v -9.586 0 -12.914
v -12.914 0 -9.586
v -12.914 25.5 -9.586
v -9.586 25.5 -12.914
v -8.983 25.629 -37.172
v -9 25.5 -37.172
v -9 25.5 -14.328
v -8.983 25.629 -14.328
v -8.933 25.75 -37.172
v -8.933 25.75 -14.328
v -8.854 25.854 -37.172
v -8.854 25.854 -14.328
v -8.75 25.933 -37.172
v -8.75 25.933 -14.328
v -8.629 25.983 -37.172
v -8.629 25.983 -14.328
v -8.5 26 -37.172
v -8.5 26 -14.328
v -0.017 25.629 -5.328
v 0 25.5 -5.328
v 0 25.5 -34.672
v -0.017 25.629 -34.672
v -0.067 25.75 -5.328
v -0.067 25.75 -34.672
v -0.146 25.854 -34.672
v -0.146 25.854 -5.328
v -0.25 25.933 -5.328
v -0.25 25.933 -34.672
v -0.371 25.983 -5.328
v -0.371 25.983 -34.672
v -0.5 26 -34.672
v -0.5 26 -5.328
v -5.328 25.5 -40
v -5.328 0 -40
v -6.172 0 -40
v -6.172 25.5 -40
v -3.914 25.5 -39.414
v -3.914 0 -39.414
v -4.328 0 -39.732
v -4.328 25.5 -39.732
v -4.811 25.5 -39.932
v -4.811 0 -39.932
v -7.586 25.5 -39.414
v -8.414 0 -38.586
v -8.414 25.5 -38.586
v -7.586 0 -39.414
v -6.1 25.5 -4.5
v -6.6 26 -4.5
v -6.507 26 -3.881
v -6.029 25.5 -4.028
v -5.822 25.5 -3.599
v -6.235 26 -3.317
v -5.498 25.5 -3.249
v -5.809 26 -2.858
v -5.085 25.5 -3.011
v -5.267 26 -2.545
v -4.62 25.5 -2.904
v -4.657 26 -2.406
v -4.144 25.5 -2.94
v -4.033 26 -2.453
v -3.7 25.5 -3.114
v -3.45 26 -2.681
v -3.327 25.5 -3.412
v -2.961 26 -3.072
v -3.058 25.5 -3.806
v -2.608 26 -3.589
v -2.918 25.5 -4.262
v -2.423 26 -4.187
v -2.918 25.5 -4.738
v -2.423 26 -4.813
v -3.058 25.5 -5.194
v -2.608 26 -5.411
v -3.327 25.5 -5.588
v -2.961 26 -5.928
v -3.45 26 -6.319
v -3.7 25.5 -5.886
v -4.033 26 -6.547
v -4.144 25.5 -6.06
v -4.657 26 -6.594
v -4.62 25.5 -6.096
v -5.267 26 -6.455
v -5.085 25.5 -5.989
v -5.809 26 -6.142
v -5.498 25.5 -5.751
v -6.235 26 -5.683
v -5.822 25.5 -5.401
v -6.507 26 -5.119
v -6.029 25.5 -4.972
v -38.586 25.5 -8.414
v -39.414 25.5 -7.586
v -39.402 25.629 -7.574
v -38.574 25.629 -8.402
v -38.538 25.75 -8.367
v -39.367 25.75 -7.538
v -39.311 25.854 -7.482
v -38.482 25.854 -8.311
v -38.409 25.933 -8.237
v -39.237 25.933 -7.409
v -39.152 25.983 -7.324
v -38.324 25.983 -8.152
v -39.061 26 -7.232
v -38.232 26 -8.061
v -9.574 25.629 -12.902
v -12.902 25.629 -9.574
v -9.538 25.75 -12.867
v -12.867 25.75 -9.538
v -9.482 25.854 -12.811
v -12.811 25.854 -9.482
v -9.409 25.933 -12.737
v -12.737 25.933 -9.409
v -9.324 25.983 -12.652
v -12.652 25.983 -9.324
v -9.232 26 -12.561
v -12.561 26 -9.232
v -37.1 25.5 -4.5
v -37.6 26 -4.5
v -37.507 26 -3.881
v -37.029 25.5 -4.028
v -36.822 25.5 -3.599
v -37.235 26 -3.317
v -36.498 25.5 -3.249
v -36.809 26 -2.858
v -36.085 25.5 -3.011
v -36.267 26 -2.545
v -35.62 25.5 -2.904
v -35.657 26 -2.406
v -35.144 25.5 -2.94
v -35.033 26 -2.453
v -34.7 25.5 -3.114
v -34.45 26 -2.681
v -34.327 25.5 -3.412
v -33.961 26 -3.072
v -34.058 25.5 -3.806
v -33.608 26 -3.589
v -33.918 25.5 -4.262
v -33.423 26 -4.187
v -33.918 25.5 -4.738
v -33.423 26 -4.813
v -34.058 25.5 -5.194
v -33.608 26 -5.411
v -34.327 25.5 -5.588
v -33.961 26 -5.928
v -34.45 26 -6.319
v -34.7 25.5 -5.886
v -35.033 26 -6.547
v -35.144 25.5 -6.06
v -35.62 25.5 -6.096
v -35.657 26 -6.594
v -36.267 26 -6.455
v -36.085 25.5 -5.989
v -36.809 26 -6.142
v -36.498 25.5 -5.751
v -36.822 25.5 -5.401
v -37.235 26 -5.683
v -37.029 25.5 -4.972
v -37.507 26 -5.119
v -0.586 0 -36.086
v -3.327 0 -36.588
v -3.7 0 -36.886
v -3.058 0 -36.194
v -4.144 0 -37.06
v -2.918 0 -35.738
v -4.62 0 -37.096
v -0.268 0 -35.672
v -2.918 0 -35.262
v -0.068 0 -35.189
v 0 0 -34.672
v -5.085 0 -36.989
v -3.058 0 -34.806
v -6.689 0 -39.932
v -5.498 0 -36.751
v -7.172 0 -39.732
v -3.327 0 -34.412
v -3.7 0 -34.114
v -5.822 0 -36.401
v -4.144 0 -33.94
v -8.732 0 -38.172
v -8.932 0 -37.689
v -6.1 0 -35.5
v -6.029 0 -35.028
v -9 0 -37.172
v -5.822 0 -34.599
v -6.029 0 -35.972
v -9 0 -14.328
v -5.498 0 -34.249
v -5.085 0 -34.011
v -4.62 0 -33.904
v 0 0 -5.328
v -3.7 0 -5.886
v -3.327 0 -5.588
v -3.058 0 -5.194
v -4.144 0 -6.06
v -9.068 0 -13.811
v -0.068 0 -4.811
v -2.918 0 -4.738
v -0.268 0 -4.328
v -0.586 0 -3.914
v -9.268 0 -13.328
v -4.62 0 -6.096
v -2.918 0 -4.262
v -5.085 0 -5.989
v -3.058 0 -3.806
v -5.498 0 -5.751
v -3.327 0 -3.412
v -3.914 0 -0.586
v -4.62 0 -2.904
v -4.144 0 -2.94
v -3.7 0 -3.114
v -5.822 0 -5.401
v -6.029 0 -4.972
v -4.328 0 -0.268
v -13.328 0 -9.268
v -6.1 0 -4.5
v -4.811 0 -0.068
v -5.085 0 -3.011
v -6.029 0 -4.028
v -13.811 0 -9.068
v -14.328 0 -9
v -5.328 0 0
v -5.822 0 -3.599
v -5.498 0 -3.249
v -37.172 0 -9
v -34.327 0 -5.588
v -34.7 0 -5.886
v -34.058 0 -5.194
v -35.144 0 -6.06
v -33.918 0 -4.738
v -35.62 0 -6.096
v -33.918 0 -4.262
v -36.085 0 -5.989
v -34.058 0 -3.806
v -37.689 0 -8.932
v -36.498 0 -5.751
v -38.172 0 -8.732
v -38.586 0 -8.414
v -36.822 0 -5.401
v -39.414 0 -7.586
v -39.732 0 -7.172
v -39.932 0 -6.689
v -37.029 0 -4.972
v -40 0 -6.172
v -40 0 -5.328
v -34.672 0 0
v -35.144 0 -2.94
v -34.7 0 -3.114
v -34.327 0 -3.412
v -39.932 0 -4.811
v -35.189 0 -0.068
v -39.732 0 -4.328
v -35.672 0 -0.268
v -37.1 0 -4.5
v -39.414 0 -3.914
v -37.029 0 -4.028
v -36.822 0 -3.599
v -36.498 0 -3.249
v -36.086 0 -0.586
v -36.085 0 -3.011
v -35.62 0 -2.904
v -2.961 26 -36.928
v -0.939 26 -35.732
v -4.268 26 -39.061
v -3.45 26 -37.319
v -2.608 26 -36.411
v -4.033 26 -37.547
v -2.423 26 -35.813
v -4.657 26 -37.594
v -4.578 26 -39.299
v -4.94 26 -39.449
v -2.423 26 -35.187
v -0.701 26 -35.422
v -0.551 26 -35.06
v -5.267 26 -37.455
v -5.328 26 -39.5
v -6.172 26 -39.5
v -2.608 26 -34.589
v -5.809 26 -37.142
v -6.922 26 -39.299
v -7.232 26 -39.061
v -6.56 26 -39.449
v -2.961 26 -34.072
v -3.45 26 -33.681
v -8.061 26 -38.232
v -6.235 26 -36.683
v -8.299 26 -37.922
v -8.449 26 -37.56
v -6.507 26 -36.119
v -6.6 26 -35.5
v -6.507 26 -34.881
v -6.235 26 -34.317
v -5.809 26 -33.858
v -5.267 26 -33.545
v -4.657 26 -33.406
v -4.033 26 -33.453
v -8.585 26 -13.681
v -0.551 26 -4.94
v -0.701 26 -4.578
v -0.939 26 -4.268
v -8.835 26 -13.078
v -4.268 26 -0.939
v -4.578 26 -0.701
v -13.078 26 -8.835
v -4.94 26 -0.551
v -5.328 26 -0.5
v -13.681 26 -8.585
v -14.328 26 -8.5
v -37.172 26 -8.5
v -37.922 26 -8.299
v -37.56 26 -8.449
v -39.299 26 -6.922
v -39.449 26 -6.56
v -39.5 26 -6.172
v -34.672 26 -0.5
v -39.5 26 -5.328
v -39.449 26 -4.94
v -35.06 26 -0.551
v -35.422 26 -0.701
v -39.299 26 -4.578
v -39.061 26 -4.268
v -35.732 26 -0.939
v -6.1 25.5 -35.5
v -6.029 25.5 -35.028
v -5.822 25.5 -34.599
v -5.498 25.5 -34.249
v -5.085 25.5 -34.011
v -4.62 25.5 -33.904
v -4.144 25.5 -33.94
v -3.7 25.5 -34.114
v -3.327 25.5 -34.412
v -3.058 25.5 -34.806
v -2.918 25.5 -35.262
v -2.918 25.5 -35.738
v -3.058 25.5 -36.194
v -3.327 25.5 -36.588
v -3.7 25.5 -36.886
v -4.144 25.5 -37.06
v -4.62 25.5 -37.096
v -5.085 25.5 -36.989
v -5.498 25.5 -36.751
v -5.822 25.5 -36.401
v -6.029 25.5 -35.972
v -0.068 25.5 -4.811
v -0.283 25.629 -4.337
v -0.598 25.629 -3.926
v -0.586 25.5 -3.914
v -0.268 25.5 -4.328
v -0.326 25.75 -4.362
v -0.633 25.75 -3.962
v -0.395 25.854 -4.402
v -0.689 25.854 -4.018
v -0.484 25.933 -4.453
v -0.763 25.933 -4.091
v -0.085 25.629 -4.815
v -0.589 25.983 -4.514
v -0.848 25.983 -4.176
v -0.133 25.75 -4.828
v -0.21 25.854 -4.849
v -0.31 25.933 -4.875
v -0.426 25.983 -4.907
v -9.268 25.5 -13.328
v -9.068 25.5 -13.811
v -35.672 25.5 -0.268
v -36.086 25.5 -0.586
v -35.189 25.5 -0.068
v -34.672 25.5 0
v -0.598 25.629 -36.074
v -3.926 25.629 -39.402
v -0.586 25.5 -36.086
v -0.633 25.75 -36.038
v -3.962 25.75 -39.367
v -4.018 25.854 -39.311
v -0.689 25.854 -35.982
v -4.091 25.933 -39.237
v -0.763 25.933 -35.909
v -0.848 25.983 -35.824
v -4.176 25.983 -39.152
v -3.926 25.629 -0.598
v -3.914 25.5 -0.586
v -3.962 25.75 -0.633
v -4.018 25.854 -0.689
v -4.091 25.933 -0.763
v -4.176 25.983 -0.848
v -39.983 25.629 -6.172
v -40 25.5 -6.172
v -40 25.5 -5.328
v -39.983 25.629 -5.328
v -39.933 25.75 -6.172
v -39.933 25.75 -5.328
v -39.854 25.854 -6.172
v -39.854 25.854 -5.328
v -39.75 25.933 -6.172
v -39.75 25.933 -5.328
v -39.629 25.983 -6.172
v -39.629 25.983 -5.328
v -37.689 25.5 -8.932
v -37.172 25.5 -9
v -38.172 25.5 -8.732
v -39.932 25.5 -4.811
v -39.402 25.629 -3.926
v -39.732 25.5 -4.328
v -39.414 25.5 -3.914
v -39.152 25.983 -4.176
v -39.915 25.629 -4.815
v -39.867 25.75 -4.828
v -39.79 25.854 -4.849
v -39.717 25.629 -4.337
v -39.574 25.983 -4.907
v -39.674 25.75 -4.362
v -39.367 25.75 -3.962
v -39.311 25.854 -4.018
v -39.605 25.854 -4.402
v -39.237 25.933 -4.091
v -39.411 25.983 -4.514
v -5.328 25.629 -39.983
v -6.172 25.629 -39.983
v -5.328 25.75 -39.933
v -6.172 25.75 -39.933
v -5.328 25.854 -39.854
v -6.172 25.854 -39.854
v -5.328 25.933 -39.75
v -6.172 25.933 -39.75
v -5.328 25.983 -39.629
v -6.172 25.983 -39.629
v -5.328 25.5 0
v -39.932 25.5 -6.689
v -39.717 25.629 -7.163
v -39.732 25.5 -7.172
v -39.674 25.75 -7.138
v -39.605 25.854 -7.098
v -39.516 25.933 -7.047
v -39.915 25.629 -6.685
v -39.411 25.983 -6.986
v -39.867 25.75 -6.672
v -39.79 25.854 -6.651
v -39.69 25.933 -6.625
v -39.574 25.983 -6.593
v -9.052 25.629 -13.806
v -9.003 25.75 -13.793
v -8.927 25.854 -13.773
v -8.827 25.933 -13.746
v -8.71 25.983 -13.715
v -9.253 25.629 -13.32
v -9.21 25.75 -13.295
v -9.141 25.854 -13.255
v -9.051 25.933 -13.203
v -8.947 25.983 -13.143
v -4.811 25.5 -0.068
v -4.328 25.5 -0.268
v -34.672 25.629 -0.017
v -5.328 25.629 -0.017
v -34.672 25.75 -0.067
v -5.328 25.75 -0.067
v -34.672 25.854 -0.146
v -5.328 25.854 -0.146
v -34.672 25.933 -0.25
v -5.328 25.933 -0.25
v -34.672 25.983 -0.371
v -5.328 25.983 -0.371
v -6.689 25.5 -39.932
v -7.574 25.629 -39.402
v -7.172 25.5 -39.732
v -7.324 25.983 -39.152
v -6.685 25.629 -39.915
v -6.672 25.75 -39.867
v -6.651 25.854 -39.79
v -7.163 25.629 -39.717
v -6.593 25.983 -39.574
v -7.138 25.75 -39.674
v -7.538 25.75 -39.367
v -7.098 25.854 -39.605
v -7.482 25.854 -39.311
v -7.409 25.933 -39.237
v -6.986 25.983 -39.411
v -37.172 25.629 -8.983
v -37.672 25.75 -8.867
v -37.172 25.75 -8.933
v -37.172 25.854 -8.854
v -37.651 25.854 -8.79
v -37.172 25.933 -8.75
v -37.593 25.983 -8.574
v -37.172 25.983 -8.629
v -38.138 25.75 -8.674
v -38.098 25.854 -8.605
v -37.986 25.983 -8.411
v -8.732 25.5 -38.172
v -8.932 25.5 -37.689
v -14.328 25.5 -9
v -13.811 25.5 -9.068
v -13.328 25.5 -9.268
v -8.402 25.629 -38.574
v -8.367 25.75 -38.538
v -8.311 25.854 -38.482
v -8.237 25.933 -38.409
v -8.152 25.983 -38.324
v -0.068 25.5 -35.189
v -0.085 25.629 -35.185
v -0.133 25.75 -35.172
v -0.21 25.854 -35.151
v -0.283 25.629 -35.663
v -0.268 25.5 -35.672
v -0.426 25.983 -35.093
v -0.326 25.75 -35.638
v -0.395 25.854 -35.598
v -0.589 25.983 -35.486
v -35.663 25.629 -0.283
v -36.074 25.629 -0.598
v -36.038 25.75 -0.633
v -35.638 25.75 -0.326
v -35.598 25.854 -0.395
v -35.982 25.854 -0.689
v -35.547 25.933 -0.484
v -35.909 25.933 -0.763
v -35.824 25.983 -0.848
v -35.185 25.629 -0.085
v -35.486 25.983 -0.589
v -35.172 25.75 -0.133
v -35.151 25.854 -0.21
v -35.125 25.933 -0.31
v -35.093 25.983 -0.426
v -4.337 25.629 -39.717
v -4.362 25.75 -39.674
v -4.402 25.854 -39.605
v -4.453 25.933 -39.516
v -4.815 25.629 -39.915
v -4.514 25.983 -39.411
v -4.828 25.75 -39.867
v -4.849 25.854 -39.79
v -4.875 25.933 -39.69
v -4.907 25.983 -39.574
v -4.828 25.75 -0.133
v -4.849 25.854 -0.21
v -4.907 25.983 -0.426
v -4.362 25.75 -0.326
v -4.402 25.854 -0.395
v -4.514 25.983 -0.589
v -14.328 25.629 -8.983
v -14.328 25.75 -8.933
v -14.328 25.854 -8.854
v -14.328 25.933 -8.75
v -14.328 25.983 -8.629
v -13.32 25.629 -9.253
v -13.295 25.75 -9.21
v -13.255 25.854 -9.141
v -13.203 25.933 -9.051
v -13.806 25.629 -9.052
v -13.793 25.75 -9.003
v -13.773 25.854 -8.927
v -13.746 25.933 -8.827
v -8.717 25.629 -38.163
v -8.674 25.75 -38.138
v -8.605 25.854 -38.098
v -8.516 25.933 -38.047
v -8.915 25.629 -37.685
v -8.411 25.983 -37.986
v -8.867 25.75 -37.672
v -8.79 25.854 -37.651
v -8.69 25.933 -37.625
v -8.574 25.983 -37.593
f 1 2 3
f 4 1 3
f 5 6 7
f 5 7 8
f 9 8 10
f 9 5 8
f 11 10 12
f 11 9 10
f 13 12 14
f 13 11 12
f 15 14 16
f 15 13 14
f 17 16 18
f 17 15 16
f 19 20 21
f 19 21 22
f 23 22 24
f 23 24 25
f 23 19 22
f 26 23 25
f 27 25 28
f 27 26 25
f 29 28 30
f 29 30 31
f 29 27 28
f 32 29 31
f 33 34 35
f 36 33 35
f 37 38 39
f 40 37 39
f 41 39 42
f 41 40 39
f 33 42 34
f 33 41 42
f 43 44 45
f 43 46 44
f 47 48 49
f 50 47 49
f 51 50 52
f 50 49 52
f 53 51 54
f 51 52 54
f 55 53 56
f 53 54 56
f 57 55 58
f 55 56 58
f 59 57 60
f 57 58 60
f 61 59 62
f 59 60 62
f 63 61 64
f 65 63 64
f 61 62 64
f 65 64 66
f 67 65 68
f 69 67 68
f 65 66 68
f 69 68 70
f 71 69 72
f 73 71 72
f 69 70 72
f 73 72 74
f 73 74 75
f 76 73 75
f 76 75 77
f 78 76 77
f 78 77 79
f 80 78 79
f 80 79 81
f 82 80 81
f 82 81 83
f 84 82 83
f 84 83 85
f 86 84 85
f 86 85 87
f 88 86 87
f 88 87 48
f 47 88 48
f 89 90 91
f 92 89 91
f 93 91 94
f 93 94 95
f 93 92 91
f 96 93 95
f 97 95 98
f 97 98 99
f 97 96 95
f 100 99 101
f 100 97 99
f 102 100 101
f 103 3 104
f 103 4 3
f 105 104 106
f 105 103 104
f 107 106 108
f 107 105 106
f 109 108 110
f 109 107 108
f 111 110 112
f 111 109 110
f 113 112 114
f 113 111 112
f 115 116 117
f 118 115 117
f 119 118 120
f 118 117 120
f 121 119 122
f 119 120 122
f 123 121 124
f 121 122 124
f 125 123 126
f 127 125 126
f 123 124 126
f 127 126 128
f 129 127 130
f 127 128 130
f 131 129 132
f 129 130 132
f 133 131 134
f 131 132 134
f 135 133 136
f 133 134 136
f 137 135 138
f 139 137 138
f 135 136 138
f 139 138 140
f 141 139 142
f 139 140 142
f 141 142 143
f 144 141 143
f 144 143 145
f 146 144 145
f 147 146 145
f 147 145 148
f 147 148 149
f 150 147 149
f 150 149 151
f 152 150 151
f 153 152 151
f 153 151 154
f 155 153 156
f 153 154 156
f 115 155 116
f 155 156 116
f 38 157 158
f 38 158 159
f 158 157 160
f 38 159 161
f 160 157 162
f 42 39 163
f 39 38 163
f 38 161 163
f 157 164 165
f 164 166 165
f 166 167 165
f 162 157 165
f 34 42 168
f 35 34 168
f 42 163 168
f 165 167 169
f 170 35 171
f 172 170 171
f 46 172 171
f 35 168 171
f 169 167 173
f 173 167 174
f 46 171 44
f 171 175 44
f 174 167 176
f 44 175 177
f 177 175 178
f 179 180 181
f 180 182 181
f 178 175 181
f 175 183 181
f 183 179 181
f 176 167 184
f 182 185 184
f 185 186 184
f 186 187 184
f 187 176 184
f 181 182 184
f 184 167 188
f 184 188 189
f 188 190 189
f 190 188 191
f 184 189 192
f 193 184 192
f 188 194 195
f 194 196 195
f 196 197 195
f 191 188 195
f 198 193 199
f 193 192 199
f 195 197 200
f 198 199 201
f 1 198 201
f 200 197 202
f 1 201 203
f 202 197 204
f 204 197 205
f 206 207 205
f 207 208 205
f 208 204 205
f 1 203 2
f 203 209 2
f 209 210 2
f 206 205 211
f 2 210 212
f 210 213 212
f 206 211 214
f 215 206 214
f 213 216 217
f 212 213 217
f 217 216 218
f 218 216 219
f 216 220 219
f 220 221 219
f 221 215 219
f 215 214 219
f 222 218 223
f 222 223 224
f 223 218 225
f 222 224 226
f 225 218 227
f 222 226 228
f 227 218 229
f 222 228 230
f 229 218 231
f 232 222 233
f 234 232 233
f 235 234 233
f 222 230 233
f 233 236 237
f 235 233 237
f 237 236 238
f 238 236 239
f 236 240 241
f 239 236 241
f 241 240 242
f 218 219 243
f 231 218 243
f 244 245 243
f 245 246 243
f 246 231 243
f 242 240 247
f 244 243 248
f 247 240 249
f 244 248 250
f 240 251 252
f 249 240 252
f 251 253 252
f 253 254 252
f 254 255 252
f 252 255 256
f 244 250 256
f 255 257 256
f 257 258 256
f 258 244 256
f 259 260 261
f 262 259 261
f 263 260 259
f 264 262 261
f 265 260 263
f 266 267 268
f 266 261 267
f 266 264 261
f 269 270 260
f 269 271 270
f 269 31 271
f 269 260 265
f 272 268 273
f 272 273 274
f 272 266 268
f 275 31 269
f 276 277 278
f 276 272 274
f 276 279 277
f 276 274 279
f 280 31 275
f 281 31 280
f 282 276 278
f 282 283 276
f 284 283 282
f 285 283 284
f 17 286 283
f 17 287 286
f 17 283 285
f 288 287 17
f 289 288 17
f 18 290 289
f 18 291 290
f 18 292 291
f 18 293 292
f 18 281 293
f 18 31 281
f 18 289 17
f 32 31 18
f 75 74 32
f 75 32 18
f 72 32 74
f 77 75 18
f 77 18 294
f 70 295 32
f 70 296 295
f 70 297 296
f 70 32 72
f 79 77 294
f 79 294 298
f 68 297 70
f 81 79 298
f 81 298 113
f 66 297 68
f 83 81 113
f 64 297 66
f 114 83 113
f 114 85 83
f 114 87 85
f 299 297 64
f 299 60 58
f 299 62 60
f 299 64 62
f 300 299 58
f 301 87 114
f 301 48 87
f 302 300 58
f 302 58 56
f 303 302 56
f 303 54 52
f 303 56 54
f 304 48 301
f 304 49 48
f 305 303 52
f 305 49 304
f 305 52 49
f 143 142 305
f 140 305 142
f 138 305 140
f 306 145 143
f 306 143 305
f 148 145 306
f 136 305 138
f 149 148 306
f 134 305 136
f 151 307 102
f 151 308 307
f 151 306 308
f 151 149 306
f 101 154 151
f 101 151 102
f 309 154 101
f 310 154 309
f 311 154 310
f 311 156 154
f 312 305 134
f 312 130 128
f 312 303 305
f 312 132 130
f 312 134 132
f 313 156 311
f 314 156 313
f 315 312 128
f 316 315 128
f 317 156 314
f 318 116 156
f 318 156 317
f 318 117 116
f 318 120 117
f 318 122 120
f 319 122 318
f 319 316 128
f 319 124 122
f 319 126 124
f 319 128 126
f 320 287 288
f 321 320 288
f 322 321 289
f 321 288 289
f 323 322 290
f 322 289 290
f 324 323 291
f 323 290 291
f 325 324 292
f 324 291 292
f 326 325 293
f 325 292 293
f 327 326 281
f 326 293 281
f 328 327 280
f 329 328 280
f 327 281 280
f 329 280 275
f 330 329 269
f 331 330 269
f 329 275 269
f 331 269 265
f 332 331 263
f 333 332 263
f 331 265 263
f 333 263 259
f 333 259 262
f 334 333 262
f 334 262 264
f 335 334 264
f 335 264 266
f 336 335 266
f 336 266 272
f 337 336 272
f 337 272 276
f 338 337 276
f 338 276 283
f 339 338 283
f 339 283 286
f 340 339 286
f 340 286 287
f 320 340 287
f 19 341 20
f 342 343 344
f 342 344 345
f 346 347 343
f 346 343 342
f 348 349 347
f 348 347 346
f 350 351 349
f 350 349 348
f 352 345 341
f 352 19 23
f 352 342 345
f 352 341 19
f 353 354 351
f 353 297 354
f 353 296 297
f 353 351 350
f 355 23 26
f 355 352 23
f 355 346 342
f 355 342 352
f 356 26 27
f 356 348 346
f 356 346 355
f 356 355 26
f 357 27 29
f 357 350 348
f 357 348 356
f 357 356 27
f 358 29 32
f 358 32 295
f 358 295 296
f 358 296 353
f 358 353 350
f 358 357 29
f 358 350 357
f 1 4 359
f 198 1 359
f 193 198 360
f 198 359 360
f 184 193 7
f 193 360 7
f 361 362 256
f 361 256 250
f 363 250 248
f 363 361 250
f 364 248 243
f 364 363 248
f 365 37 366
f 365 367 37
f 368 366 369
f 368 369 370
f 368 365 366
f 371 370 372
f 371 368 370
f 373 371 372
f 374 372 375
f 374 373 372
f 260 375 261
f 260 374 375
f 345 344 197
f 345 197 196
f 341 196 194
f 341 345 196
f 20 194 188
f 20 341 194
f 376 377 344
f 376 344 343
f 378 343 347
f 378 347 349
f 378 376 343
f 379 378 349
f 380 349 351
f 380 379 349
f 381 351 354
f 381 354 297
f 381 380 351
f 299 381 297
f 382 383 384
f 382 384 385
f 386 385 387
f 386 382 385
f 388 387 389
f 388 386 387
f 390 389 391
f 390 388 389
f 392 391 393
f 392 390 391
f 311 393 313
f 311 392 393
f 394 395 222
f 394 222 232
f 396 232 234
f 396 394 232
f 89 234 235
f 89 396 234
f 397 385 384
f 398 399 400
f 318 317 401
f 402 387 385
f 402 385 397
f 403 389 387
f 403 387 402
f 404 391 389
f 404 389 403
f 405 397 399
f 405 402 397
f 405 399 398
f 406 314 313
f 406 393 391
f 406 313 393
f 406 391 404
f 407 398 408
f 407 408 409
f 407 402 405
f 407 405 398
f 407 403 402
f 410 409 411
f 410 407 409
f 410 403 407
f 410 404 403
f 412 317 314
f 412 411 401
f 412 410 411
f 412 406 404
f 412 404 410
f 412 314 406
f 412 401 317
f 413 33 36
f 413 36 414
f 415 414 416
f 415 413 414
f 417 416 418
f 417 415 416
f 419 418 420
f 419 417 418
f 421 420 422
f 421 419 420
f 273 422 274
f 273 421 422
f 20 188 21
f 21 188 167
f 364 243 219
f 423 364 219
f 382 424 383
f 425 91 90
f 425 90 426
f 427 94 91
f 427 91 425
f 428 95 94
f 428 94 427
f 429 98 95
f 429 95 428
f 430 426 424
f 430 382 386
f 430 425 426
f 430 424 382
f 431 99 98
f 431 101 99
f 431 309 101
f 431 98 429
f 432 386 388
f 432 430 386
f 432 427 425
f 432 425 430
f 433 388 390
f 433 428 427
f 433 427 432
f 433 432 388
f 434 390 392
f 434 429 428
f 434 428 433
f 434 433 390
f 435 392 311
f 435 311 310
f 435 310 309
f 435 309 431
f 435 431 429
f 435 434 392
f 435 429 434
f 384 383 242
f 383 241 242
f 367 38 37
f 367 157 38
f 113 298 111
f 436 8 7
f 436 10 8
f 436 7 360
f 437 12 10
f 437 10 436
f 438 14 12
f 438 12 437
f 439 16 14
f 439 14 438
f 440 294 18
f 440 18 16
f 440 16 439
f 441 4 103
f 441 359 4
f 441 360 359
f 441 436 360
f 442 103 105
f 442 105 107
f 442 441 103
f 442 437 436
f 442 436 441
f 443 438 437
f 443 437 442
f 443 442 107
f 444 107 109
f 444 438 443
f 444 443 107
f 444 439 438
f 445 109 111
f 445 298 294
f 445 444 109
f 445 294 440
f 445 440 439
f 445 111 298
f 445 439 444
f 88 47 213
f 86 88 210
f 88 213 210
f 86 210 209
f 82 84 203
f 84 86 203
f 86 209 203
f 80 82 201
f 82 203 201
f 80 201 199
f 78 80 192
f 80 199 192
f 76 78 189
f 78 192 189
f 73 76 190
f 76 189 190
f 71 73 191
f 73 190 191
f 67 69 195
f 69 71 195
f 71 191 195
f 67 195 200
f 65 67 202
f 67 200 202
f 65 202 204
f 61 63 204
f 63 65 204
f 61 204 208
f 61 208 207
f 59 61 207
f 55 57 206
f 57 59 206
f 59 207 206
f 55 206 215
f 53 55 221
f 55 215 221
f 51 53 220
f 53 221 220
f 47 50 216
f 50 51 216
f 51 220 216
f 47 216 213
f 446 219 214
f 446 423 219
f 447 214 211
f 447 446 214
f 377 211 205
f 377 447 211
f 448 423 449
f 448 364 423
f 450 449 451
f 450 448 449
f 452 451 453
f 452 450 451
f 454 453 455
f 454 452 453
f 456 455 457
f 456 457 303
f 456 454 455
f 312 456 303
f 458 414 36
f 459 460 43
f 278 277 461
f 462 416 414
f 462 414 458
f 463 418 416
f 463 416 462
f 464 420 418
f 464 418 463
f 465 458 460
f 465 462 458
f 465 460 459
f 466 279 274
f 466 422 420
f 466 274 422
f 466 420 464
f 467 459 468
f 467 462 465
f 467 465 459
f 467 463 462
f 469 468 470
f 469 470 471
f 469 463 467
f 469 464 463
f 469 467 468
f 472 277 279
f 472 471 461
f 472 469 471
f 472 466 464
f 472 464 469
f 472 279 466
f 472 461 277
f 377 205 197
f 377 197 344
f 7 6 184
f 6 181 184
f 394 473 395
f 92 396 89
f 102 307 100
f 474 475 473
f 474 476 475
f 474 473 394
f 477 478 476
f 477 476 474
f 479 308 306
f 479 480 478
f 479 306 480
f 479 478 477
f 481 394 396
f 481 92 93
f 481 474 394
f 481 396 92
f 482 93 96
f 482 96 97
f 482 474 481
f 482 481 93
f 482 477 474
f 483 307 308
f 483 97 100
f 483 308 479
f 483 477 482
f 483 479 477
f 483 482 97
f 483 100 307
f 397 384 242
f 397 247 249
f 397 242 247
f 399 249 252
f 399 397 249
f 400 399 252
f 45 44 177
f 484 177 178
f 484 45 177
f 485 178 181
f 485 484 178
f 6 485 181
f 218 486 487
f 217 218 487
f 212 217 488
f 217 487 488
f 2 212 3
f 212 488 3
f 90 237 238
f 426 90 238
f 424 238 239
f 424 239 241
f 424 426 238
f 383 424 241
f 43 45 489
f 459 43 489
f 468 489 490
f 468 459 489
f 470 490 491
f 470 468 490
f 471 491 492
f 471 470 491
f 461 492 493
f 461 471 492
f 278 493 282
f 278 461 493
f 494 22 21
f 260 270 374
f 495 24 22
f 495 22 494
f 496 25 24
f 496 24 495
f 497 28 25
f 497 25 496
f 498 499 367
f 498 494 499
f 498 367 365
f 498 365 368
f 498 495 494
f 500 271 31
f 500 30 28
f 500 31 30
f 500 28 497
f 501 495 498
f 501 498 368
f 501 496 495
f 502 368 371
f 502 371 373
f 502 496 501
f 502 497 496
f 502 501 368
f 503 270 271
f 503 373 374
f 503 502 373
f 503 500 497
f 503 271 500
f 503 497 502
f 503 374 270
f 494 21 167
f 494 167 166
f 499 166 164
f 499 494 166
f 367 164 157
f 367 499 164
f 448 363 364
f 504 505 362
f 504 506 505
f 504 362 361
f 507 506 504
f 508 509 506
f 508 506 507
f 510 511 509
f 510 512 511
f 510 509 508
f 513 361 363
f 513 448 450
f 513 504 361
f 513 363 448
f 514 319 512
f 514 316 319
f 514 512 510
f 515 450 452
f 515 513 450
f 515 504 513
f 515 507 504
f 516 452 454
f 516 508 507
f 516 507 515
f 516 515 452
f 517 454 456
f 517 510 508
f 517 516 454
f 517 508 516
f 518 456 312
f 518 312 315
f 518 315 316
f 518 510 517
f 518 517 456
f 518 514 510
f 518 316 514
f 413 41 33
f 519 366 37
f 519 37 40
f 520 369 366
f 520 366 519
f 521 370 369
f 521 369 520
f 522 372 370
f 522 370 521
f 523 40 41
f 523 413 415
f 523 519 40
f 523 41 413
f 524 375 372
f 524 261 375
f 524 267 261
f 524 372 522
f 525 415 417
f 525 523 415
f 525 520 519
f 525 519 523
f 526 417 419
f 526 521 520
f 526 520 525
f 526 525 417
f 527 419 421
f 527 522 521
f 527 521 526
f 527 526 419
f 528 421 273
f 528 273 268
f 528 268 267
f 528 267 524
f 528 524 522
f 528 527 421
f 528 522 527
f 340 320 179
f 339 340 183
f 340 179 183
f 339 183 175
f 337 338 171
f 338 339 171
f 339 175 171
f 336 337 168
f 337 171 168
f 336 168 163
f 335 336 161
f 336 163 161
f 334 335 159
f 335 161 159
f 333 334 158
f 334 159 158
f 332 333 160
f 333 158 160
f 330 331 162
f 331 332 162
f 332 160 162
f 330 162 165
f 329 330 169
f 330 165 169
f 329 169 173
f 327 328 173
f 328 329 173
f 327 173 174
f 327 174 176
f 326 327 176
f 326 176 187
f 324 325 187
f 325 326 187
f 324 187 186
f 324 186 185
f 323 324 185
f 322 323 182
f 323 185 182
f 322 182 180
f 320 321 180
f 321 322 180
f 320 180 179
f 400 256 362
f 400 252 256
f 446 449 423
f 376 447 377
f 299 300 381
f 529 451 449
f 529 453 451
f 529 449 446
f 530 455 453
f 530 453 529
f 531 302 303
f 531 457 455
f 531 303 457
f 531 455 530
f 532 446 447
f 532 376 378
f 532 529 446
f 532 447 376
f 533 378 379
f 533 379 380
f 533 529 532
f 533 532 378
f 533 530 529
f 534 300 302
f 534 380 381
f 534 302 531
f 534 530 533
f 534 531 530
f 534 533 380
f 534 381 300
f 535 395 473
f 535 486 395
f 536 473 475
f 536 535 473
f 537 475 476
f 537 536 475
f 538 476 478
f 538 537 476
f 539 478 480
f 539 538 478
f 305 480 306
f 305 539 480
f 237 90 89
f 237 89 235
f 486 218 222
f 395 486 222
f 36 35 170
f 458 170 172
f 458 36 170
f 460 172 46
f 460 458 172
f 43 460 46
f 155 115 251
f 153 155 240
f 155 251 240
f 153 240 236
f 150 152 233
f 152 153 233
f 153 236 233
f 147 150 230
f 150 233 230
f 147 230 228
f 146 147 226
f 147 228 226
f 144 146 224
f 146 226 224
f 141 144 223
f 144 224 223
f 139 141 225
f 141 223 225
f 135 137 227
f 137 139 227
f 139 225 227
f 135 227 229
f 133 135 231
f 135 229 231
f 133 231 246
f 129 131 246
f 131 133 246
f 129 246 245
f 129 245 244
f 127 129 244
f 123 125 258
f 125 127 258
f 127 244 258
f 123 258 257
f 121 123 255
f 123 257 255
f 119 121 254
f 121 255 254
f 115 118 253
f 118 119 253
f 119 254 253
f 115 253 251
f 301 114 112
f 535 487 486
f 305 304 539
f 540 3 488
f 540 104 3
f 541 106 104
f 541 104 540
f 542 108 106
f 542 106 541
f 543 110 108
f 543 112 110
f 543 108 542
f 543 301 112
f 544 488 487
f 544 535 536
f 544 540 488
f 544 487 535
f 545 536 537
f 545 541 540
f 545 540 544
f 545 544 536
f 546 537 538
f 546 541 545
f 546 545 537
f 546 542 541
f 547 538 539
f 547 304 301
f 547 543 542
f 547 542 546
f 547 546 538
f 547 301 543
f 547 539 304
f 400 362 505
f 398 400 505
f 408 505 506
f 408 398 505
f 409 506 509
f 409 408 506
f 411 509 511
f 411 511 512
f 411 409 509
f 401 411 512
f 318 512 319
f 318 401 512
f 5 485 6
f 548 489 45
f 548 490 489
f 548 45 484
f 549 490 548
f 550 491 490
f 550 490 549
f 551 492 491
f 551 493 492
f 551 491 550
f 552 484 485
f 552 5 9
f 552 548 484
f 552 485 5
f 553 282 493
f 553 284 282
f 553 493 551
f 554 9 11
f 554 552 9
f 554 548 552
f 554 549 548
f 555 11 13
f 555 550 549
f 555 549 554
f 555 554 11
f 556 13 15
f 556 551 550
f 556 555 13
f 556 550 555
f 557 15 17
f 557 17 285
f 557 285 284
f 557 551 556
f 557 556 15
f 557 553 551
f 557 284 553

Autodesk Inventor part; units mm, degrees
ref_plane "YZ Plane" through (0, 0, 0) normal (1, 0, 0) x (0, 1, 0)
ref_plane "XZ Plane" through (0, 0, 0) normal (0, 1, 0) x (-1, 0, 0)
ref_plane "XY Plane" through (0, 0, 0) normal (0, 0, 1) x (1, 0, 0)
sketch "Sketch1" plane through (0, 0, 0) normal (0, 1, 0) x (-1, 0, 0)
  line L0 (0, 0) -> (0, -35.5002)
  line L1 (9, -9) -> (35.5, -9)
  line L2 (35.5002, 0) -> (0, 0)
  circle A0 centre (4.5, -4.5) radius 1.6
  circle A1 centre (35.5, -4.5) radius 1.6
  circle A2 centre (4.5, -35.5) radius 1.6
  line L3 (9, -35.5) -> (9, -9)
  line L4 (31, -9) -> (40, -9)
  line L5 (40, -9) -> (40, 0)
  line L6 (40, 0) -> (31, 0)
  line L7 (31, -9) -> (40, 0) construction
  line L8 (40, -9) -> (31, 0) construction
  line L9 (0, -31) -> (0, -40)
  line L10 (0, -40) -> (9, -40)
  line L11 (9, -40) -> (9, -31)
  line L12 (9, -31) -> (0, -40) construction
  line L13 (0, -31) -> (9, -40) construction
  arc A3 (35.4998, 0) -> (35.4998, 0) centre (35.5, -4.5) ccw
  point P0 (0, 0)
  point P1 (0, -9)
  dimension "d8" = 3.2
  dimension "d21" = 4.5
  dimension "d22" = 31
  dimension "d23" = 31
  dimension "d38" = 4.5
extrude "Extrusion1" add sketch "Sketch1" along normal blind 26
chamfer "Chamfer2" distance 2 angle 45 2 edges at (-40, 13, -9) (-9, 13, -40)
chamfer "Chamfer3" distance 4.5 angle 45 4 edges at (-40, 13, 0) (0, 13, 0) (0, 13, -40) (-9, 13, -9)
fillet "Fillet4" radius 2 12 edges at (-40, 13, -7) (-35.5, 13, 0) (-40, 13, -4.5) (-38, 13, -9) (-9, 13, -38) (-7, 13, -40) (-4.5, 13, -40) (0, 13, -35.5) (0, 13, -4.5) (-4.5, 13, 0) (-13.5, 13, -9) (-9, 13, -13.5)
fillet "Fillet5" radius 0.5 23 edges at (-4.5631, 26, -0.1522) (-2.25, 26, -2.25) (-0.1522, 26, -4.5631) (0, 26, -20) (-0.1522, 26, -35.4369) (-2.25, 26, -37.75) (-4.5631, 26, -39.8478) (-5.75, 26, -40) (-6.9369, 26, -39.8478) (-8, 26, -39) (-8.8478, 26, -37.9369) (-9, 26, -24.9142) (-9, 26, -36.3358) (-24.9142, 26, -9) (-36.3358, 26, -9) (-37.9369, 26, -8.8478) (-39, 26, -8) (-39.8478, 26, -6.9369) (-40, 26, -5.75) (-39.8478, 26, -4.5631) (-37.75, 26, -2.25) (-35.4369, 26, -0.1522) (-20, 26, 0)
chamfer "Chamfer4" distance 0.5 angle 45 3 edges at (-33.9, 26, -4.5) (-2.9, 26, -4.5) (-2.9, 26, -35.5)
properties part number "stepper spacer"
